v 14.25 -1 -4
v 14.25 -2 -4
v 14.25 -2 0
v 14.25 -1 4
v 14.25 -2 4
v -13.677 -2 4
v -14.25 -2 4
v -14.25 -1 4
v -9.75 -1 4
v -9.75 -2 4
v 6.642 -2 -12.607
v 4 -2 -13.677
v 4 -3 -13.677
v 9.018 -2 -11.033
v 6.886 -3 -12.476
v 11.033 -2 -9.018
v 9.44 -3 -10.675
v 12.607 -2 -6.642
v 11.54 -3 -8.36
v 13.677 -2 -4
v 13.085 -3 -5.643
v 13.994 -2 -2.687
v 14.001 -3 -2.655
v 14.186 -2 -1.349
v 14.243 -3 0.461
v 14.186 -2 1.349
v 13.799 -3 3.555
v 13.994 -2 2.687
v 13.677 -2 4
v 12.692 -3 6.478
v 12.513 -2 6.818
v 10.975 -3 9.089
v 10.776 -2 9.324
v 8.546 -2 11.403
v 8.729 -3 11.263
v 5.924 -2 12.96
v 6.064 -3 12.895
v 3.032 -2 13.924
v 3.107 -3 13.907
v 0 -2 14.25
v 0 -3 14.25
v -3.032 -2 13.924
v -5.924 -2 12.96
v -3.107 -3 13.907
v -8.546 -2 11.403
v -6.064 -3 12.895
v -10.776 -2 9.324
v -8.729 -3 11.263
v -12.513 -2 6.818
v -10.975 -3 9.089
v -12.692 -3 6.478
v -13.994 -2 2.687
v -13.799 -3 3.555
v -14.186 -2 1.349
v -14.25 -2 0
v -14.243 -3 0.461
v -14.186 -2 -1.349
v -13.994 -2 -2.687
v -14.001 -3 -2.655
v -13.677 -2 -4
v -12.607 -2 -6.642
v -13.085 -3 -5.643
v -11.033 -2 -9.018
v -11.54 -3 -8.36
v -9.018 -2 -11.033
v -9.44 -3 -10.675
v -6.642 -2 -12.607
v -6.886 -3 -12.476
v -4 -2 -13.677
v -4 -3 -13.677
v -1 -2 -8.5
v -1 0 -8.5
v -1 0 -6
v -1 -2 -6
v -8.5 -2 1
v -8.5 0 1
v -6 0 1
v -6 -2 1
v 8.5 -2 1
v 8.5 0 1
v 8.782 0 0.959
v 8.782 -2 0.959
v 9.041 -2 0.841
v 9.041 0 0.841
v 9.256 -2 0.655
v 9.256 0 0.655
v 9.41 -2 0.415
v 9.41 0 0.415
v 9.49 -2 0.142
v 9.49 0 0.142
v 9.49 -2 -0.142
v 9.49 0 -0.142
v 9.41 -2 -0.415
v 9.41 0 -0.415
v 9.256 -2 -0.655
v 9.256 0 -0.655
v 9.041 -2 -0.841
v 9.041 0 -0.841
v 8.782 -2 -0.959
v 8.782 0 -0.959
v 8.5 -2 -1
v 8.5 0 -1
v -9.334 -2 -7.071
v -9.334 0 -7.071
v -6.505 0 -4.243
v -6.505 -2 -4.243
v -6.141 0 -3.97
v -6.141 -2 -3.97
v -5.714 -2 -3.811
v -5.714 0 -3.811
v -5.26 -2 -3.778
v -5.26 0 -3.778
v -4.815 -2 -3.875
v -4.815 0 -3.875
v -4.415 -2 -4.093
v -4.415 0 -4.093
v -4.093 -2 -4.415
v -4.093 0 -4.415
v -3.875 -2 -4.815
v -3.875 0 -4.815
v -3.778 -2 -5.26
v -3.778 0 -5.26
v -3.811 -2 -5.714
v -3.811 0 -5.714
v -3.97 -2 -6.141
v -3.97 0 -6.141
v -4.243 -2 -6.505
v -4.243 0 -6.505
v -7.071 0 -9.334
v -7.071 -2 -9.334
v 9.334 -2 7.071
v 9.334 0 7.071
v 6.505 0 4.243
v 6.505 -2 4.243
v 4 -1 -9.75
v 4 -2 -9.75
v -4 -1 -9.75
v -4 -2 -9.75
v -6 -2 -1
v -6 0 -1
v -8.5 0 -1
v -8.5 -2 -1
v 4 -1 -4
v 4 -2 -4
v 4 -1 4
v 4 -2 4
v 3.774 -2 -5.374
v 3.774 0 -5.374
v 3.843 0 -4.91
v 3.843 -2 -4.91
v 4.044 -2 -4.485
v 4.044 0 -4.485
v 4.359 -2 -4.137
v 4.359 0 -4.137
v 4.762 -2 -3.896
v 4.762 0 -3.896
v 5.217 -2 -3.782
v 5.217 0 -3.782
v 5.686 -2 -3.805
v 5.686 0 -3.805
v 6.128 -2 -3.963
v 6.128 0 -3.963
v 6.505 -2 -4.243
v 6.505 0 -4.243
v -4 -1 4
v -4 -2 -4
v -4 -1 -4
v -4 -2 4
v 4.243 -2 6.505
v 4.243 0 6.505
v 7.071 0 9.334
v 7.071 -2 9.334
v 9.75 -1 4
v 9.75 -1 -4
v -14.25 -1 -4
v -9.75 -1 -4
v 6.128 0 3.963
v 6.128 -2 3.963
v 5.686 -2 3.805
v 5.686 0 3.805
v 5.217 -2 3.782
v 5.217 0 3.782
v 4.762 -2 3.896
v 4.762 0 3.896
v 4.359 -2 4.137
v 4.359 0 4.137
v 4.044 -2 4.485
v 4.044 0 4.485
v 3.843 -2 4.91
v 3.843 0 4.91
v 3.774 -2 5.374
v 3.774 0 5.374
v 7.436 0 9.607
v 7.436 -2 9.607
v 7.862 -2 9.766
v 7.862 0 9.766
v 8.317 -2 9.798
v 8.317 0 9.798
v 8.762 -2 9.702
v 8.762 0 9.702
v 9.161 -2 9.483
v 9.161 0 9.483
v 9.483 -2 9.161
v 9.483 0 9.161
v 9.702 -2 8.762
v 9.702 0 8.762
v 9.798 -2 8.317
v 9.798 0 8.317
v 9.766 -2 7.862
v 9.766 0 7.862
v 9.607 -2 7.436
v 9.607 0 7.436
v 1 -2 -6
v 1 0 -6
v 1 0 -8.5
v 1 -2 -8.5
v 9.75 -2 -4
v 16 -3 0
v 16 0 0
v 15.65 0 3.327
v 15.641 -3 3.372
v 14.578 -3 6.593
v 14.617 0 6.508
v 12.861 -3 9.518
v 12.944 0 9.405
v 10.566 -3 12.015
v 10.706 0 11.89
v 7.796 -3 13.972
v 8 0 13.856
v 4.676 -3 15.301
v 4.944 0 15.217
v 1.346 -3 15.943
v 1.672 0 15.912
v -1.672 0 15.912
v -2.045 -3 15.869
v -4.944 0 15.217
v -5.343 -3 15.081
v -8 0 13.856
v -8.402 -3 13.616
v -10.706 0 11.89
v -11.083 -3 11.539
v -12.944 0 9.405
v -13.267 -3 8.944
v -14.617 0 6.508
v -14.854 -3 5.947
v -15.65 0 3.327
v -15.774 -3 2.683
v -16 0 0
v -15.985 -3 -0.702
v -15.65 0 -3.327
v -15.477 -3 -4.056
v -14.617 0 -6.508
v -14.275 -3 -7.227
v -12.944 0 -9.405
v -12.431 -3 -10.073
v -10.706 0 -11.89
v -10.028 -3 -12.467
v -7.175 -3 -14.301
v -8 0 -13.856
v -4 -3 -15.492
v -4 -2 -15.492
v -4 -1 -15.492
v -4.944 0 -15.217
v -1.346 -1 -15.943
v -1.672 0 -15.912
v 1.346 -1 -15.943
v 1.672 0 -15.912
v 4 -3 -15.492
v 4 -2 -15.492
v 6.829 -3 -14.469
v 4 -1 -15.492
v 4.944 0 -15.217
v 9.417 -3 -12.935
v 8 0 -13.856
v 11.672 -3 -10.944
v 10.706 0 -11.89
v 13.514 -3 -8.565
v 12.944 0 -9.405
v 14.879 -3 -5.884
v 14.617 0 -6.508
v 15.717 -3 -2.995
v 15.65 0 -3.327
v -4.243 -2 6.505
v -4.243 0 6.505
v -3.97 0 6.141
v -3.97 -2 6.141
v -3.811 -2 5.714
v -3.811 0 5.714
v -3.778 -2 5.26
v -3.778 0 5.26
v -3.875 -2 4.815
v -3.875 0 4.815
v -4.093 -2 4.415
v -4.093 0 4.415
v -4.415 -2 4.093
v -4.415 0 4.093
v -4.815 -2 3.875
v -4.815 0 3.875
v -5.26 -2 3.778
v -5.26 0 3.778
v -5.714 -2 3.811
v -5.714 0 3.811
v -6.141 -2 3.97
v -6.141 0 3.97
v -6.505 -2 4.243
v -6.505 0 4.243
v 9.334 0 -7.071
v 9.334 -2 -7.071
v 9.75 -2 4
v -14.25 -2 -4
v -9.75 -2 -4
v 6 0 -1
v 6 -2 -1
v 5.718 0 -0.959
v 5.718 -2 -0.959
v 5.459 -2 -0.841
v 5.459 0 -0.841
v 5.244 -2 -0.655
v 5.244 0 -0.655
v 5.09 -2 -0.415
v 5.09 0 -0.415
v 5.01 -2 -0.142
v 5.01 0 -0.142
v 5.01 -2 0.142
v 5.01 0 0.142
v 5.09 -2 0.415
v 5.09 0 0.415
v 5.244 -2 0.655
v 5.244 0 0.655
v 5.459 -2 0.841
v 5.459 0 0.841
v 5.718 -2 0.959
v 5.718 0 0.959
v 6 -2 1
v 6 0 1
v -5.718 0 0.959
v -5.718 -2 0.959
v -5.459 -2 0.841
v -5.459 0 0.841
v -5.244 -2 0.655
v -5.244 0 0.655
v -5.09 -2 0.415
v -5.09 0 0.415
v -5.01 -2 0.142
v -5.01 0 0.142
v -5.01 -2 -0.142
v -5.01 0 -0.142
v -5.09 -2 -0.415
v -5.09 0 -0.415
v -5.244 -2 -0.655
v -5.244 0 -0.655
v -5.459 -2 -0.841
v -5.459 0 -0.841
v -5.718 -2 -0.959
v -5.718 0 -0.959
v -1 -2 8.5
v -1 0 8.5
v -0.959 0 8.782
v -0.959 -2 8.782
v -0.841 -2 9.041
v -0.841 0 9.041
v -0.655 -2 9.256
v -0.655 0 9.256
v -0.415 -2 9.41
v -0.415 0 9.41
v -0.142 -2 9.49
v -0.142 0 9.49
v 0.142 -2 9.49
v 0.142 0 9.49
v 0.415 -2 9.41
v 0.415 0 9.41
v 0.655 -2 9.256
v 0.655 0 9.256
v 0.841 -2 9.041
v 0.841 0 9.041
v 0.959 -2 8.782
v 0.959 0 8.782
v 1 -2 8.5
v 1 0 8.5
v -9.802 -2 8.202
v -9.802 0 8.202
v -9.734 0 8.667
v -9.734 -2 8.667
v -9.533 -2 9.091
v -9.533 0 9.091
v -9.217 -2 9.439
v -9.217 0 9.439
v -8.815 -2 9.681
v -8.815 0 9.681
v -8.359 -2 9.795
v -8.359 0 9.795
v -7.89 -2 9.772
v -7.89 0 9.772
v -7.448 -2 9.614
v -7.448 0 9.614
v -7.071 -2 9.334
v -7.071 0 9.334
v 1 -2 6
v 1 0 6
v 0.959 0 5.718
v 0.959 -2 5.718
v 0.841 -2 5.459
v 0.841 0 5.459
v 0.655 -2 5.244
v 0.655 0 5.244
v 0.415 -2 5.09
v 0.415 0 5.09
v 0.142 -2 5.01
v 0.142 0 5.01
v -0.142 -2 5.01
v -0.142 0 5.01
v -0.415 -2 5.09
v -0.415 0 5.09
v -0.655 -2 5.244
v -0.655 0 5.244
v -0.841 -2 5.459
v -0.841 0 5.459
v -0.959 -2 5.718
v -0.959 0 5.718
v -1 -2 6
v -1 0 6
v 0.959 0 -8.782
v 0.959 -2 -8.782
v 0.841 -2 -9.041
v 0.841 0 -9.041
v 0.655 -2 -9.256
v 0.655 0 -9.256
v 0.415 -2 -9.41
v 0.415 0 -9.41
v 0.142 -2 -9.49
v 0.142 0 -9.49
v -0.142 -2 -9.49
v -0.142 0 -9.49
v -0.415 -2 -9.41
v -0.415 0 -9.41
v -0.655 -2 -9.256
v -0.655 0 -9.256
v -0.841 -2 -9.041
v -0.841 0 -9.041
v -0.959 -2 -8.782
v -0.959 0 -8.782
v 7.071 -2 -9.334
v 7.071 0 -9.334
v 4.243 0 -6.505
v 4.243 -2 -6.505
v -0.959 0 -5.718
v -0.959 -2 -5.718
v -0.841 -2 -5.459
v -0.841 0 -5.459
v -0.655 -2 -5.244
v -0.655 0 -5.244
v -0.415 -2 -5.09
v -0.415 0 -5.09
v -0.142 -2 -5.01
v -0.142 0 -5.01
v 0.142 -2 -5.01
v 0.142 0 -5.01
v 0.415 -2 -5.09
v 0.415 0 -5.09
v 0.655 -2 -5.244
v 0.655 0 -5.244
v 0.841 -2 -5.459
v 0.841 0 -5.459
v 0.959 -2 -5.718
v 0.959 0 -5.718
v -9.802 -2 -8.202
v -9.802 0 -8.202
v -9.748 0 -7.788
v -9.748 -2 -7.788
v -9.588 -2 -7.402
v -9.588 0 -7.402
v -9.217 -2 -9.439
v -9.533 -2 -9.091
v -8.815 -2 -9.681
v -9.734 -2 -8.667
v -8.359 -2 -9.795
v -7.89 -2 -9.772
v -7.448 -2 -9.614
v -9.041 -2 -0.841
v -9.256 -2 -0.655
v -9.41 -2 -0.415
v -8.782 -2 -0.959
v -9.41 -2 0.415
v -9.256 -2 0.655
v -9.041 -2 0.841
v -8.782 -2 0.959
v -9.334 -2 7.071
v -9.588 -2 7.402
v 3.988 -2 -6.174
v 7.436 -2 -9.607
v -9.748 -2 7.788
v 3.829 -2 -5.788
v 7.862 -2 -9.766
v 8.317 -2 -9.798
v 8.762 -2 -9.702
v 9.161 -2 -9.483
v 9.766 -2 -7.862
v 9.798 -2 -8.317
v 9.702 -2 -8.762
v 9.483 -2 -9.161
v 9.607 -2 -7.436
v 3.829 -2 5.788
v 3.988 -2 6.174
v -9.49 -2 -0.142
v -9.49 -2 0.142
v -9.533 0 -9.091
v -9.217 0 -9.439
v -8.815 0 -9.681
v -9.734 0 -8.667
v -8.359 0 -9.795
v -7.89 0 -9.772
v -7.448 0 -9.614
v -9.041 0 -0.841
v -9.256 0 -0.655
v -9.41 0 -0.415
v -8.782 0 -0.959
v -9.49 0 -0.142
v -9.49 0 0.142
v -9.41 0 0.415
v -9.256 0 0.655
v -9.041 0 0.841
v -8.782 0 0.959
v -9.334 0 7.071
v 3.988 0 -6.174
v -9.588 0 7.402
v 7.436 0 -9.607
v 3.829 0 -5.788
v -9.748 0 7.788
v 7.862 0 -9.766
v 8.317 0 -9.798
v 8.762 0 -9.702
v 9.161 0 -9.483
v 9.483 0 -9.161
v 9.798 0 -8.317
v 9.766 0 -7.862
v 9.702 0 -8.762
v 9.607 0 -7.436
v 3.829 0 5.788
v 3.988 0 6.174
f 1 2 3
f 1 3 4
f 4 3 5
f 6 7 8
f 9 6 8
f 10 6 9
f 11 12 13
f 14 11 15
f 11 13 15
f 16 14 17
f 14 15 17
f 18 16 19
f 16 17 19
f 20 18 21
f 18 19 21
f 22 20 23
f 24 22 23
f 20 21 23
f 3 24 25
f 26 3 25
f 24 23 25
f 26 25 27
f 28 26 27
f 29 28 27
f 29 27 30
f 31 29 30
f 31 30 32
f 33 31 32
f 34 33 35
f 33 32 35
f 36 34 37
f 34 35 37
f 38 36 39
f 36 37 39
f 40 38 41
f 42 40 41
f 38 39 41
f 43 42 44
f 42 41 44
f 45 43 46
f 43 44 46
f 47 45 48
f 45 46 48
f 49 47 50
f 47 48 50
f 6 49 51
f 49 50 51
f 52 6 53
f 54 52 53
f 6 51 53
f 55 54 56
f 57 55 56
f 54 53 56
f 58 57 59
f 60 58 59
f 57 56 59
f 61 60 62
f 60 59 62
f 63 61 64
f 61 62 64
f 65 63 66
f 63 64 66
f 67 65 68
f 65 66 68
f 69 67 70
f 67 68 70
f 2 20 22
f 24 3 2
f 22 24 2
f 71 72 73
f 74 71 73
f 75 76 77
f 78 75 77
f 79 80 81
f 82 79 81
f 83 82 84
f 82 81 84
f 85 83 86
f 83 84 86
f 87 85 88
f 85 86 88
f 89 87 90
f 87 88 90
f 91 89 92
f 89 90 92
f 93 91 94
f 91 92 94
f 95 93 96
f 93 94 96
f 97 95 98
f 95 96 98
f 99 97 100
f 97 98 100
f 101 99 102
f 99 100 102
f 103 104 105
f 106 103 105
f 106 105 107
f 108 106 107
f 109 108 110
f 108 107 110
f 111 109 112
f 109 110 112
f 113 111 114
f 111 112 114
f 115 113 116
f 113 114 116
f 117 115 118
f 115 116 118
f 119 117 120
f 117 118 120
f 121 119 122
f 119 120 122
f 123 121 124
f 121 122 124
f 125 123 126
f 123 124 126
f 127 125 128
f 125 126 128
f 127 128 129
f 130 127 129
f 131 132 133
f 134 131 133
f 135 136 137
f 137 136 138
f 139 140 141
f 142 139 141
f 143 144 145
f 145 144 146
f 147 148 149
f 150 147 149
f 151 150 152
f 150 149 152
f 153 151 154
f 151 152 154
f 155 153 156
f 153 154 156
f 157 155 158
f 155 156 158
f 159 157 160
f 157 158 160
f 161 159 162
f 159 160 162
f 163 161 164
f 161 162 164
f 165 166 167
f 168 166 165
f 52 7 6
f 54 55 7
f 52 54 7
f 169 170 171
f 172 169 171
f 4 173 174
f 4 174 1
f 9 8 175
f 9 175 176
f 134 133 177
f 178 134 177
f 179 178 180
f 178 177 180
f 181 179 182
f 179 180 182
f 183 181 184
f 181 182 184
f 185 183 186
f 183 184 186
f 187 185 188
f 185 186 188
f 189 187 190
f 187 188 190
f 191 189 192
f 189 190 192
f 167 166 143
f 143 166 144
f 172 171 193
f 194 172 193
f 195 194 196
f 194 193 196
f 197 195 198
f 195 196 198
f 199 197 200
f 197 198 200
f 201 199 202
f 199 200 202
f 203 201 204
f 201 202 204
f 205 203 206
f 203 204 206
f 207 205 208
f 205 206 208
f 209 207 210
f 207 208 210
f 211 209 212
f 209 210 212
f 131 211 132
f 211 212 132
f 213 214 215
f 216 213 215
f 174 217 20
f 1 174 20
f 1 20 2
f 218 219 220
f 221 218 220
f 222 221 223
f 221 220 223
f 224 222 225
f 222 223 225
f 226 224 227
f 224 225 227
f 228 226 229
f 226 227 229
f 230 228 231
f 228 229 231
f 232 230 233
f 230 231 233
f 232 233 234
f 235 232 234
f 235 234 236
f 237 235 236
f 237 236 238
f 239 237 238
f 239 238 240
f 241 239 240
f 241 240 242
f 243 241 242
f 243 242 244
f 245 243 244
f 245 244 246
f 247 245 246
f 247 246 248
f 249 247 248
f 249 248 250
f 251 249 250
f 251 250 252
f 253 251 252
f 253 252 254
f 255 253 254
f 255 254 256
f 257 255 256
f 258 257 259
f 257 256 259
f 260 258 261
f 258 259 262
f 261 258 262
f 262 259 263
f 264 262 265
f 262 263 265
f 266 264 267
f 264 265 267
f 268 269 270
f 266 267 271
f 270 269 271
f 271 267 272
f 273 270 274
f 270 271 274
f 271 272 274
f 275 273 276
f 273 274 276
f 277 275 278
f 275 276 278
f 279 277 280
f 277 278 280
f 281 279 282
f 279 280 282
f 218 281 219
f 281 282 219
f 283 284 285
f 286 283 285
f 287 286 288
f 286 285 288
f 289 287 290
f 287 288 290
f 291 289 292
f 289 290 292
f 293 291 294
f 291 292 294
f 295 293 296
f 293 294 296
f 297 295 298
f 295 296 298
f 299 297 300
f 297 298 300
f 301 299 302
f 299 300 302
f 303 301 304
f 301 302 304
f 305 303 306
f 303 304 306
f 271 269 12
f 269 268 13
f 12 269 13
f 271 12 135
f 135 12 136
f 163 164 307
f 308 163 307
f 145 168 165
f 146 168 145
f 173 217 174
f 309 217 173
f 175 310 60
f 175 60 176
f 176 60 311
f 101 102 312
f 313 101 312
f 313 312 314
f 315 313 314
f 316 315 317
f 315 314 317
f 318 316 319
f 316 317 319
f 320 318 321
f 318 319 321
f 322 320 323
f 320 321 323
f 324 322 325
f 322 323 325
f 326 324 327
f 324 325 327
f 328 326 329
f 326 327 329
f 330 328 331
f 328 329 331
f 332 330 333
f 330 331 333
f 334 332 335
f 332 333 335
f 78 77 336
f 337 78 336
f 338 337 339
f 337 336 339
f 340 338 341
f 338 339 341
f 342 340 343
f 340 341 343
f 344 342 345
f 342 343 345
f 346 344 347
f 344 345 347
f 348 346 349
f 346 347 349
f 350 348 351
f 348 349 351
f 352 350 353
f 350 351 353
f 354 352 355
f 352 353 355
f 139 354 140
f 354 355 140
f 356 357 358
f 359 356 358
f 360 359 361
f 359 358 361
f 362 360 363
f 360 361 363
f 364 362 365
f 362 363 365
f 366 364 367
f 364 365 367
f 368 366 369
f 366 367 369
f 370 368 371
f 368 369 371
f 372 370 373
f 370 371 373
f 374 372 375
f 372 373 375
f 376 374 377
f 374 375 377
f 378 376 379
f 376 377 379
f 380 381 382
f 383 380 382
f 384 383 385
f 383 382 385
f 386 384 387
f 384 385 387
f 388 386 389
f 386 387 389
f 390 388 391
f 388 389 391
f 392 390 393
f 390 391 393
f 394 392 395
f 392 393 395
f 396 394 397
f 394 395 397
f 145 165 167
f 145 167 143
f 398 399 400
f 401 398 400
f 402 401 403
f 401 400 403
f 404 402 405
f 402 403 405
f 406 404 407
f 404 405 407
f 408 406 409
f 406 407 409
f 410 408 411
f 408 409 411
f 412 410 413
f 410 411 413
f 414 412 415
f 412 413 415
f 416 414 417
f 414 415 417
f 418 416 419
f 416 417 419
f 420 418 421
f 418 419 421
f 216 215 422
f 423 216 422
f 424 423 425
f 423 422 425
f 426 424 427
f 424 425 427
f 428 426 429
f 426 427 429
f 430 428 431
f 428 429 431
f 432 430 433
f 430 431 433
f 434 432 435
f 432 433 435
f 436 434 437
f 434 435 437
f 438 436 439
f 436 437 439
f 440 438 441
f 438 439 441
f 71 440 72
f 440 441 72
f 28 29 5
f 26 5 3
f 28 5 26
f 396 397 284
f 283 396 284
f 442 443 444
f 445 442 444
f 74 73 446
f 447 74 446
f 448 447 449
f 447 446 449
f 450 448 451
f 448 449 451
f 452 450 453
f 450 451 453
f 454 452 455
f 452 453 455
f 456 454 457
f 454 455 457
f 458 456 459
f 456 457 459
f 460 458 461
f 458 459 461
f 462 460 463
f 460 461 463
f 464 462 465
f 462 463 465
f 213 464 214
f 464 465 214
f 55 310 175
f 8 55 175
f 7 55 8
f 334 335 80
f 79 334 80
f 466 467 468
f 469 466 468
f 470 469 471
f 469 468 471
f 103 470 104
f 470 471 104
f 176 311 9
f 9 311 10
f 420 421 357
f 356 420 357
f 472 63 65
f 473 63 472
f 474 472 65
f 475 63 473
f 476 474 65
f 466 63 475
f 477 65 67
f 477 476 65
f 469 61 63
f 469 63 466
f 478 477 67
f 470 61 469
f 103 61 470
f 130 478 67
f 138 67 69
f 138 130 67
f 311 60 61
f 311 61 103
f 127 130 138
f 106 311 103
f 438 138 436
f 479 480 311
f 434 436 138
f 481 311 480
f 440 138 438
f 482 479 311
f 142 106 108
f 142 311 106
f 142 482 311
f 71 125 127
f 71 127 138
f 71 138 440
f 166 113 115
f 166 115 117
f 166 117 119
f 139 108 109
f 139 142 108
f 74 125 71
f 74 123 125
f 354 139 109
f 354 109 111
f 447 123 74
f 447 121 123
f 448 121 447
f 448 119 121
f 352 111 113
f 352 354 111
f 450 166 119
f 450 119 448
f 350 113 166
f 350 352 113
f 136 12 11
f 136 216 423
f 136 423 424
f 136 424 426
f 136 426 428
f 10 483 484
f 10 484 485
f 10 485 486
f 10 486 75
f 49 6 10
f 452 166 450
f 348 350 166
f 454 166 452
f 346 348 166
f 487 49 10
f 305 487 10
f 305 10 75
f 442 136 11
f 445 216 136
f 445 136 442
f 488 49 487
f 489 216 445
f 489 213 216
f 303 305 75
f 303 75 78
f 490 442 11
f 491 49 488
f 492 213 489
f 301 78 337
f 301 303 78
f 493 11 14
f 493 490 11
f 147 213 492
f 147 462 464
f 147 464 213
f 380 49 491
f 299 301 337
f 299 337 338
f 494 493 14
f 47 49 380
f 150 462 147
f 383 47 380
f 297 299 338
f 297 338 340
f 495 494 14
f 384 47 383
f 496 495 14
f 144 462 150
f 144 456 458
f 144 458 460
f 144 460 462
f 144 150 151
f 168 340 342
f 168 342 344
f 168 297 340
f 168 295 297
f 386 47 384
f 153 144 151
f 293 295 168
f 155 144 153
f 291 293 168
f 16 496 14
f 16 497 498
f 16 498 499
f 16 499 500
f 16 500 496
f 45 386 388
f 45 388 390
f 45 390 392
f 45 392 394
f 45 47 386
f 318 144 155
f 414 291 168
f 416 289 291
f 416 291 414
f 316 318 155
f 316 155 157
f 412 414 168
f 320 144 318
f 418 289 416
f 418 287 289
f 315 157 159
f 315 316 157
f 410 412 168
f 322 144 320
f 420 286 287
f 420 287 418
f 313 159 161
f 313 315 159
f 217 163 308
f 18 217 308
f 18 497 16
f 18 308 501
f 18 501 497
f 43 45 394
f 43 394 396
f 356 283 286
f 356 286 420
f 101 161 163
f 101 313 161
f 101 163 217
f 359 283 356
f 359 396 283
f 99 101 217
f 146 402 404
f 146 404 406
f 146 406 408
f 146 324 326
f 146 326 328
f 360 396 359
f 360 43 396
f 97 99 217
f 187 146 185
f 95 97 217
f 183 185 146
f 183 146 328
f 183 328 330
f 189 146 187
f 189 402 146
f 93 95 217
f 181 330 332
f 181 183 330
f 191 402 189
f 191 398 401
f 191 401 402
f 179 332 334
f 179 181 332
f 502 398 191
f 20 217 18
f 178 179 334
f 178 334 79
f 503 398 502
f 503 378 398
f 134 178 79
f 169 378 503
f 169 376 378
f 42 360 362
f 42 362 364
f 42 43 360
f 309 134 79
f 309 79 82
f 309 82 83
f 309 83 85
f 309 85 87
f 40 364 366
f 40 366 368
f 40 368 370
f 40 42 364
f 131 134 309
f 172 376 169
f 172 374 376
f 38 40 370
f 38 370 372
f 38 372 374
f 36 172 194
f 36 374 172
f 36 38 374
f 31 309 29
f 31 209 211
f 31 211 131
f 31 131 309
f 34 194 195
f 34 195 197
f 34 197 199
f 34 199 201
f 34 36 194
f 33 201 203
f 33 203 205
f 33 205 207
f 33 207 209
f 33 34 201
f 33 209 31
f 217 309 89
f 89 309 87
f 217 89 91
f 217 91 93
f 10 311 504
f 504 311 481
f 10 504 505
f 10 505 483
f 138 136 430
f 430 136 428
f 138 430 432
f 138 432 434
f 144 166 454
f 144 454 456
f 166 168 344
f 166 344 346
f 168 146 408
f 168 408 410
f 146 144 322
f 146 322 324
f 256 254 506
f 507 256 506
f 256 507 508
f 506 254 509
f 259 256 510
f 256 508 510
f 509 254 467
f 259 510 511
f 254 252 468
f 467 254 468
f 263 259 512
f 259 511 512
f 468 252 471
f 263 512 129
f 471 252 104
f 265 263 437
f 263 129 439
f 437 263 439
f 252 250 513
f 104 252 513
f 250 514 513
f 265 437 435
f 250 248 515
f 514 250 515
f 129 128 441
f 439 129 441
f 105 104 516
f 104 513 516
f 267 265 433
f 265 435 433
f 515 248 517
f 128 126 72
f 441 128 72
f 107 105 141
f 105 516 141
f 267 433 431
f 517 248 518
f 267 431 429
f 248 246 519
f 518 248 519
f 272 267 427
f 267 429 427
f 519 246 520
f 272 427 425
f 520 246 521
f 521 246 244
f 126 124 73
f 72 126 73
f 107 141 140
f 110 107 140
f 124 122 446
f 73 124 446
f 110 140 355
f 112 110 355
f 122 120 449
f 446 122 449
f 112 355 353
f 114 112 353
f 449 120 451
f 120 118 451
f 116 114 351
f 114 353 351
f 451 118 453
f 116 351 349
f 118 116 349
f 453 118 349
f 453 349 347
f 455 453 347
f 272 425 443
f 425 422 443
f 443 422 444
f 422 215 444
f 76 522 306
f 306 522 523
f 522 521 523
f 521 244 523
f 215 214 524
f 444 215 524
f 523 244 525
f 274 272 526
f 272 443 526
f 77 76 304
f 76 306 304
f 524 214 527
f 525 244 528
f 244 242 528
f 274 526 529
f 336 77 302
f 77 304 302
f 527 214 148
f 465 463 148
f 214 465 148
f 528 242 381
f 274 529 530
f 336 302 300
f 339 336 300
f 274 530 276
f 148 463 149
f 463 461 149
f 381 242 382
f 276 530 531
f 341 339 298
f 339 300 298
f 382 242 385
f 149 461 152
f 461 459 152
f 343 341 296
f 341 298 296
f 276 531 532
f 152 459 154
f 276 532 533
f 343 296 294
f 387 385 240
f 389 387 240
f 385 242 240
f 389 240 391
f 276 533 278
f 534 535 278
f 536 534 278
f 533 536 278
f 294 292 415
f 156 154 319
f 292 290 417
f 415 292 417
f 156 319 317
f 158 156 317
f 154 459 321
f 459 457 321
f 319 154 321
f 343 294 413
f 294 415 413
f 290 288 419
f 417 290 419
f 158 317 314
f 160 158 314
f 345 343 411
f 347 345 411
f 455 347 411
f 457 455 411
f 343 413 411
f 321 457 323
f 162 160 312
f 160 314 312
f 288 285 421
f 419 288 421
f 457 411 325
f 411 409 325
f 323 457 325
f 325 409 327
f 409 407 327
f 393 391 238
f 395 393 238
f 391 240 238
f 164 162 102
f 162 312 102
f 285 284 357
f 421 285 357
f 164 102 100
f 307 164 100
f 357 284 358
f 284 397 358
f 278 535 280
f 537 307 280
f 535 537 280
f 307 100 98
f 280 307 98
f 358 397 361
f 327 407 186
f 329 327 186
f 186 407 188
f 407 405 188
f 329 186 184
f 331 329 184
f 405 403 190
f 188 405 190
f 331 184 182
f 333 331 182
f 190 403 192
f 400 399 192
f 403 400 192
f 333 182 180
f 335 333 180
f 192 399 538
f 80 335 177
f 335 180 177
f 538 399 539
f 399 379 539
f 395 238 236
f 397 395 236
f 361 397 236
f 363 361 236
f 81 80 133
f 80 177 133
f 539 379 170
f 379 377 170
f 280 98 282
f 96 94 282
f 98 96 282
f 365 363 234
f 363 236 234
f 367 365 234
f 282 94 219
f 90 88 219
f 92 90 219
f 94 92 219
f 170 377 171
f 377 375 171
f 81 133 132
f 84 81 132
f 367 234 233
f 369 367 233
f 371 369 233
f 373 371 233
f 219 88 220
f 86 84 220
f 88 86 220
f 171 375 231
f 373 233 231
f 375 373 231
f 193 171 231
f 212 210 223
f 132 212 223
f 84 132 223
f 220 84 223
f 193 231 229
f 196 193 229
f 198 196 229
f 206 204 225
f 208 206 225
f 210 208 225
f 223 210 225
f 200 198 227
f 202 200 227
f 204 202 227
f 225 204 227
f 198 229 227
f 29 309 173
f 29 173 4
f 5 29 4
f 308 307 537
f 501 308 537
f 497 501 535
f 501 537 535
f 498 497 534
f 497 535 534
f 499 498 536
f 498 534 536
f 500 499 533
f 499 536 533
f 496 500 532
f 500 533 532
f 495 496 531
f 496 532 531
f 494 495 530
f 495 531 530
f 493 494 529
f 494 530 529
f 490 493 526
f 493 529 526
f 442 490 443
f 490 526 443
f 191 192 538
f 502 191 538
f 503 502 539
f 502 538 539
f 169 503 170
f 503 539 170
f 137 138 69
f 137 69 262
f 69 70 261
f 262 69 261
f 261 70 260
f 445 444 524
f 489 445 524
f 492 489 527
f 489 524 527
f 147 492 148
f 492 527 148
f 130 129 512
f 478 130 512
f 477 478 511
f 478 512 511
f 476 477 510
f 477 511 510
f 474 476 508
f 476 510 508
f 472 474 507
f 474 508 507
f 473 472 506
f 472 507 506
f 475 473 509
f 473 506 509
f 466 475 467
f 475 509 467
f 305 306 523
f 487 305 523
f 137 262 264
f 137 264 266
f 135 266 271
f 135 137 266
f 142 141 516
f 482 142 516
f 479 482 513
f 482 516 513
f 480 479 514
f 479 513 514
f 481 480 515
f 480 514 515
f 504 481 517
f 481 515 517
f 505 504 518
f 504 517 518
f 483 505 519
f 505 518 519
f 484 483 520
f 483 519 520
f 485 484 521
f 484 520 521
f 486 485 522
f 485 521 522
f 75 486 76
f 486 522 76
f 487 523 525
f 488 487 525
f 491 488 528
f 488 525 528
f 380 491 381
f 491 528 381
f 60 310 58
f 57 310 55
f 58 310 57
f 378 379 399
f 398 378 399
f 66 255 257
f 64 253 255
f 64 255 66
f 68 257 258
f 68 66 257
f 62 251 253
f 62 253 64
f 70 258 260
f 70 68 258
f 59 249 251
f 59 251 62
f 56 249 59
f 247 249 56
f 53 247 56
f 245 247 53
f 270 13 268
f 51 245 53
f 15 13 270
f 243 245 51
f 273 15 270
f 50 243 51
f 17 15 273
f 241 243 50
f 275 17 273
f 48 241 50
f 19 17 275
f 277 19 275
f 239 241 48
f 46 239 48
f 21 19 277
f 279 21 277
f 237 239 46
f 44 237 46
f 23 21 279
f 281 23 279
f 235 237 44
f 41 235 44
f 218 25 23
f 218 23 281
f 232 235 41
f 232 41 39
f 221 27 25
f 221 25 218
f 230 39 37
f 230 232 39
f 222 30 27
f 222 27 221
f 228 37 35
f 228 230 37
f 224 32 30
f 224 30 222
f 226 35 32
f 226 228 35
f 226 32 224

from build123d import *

# Parameters (mm, degrees)
F0_R     = 16
F1_DEPTH = 3
F3_DEPTH = 1
F4_W     = 8
F4_H     = 8
F4_W_2   = 4.5
F5_DEPTH = 1
F7_DEPTH = 3.001
F9_DEPTH = 3.001


with BuildPart() as f1:
    # F0 (on Front) → F1 (new body)
    with BuildSketch(Plane.XZ):
        Circle(F0_R)
    extrude(amount=F1_DEPTH)

    # F2 (on face) → F3 (cut)
    with BuildSketch(Plane.XZ.offset(3)):
        with BuildLine():
            Line((4, -16.6770793666), (4, -13.6770793666))
            ThreePointArc((4, -13.6770793666), (0, 14.25), (-4, -13.6770793666))
            Line((-4, -13.6770793666), (-4, -16.6770793666))
            Line((-4, -16.6770793666), (4, -16.6770793666))
        make_face()
    extrude(amount=-F3_DEPTH, mode=Mode.SUBTRACT)

    # F4 (on face) → F5 (cut)
    with BuildSketch(Plane.XZ.offset(2)):
        Rectangle(F4_W, F4_H)
        with Locations((-12, 0)):
            Rectangle(F4_W_2, F4_H)
        with Locations((12, 0)):
            Rectangle(F4_W_2, F4_H)
        with BuildLine():
            Line((4, -13.6770793666), (4, -9.75))
            Line((4, -9.75), (-4, -9.75))
            Line((-4, -9.75), (-4, -13.6770793666))
            Line((-4, -13.6770793666), (-4, -14.25))
            Line((-4, -14.25), (-4, -15.4919333848))
            ThreePointArc((-4, -15.4919333848), (0, -16), (4, -15.4919333848))
            Line((4, -15.4919333848), (4, -14.25))
            Line((4, -14.25), (4, -13.6770793666))
        make_face()
    extrude(amount=-F5_DEPTH, mode=Mode.SUBTRACT)

    # F6 (on face) → F7 (cut, through all)
    with BuildSketch(Plane(origin=(0, 0, 0), x_dir=(-1, 0, 0), z_dir=(0, 1, 0))):
        with BuildLine():
            Line((1, 6), (1, 8.5))
            ThreePointArc((1, 8.5), (0, 9.5), (-1, 8.5))
            Line((-1, 8.5), (-1, 6))
            ThreePointArc((-1, 6), (0, 5), (1, 6))
        make_face()
        with BuildLine():
            ThreePointArc((-8.5, 1), (-9.5, 0), (-8.5, -1))
            Line((-8.5, -1), (-6, -1))
            ThreePointArc((-6, -1), (-5, 0), (-6, 1))
            Line((-6, 1), (-8.5, 1))
        make_face()
        with BuildLine():
            ThreePointArc((-1, -8.5), (0, -9.5), (1, -8.5))
            Line((1, -8.5), (1, -6))
            ThreePointArc((1, -6), (0, -5), (-1, -6))
            Line((-1, -6), (-1, -8.5))
        make_face()
        with BuildLine():
            ThreePointArc((8.5, -1), (9.5, 0), (8.5, 1))
            Line((8.5, 1), (6, 1))
            ThreePointArc((6, 1), (5, 0), (6, -1))
            Line((6, -1), (8.5, -1))
        make_face()
    extrude(amount=-F7_DEPTH, mode=Mode.SUBTRACT)

    # F8 (on face) → F9 (cut, through all)
    with BuildSketch(Plane(origin=(0, 0, 0), x_dir=(-1, 0, 0), z_dir=(0, 1, 0))):
        with BuildLine():
            ThreePointArc((-7.0710678119, -9.3338095117), (-6.7242314097, -8.8147321535), (-6.6024386618, -8.2024386618))
            ThreePointArc((-6.6024386618, -8.2024386618), (-7.59014517, -6.7242314097), (-9.3338095117, -7.0710678119))
            ThreePointArc((-9.3338095117, -7.0710678119), (-9.3338095117, -9.3338095117), (-7.0710678119, -9.3338095117))
        make_face()
        with BuildLine():
            ThreePointArc((-9.3338095117, -7.0710678119), (-7.59014517, -6.7242314097), (-6.6024386618, -8.2024386618))
            ThreePointArc((-6.6024386618, -8.2024386618), (-6.7242314097, -8.8147321535), (-7.0710678119, -9.3338095117))
            Line((-7.0710678119, -9.3338095117), (-4.2426406871, -6.5053823869))
            ThreePointArc((-4.2426406871, -6.5053823869), (-6.5053823869, -6.5053823869), (-6.5053823869, -4.2426406871))
            Line((-6.5053823869, -4.2426406871), (-9.3338095117, -7.0710678119))
        make_face()
        with BuildLine():
            ThreePointArc((-3.774011537, -5.374011537), (-4.7617180452, -3.895804285), (-6.5053823869, -4.2426406871))
            ThreePointArc((-6.5053823869, -4.2426406871), (-6.5053823869, -6.5053823869), (-4.2426406871, -6.5053823869))
            ThreePointArc((-4.2426406871, -6.5053823869), (-3.895804285, -5.9863050288), (-3.774011537, -5.374011537))
        make_face()
        with BuildLine():
            Line((9.3338095117, -7.0710678119), (6.5053823869, -4.2426406871))
            ThreePointArc((6.5053823869, -4.2426406871), (6.852218789, -4.7617180452), (6.974011537, -5.374011537))
            ThreePointArc((6.974011537, -5.374011537), (5.9863050288, -6.852218789), (4.2426406871, -6.5053823869))
            Line((4.2426406871, -6.5053823869), (7.0710678119, -9.3338095117))
            ThreePointArc((7.0710678119, -9.3338095117), (7.0710678119, -7.0710678119), (9.3338095117, -7.0710678119))
        make_face()
        with BuildLine():
            ThreePointArc((6.974011537, -5.374011537), (6.852218789, -4.7617180452), (6.5053823869, -4.2426406871))
            ThreePointArc((6.5053823869, -4.2426406871), (4.2426406871, -4.2426406871), (4.2426406871, -6.5053823869))
            ThreePointArc((4.2426406871, -6.5053823869), (5.9863050288, -6.852218789), (6.974011537, -5.374011537))
        make_face()
        with BuildLine():
            ThreePointArc((9.8024386618, -8.2024386618), (9.6806459138, -7.59014517), (9.3338095117, -7.0710678119))
            ThreePointArc((9.3338095117, -7.0710678119), (7.0710678119, -7.0710678119), (7.0710678119, -9.3338095117))
            ThreePointArc((7.0710678119, -9.3338095117), (8.8147321535, -9.6806459138), (9.8024386618, -8.2024386618))
        make_face()
        with BuildLine():
            Line((7.0710678119, 9.3338095117), (4.2426406871, 6.5053823869))
            ThreePointArc((4.2426406871, 6.5053823869), (5.9863050288, 6.852218789), (6.974011537, 5.374011537))
            ThreePointArc((6.974011537, 5.374011537), (6.852218789, 4.7617180452), (6.5053823869, 4.2426406871))
            Line((6.5053823869, 4.2426406871), (9.3338095117, 7.0710678119))
            ThreePointArc((9.3338095117, 7.0710678119), (7.0710678119, 7.0710678119), (7.0710678119, 9.3338095117))
        make_face()
        with BuildLine():
            ThreePointArc((6.974011537, 5.374011537), (5.9863050288, 6.852218789), (4.2426406871, 6.5053823869))
            ThreePointArc((4.2426406871, 6.5053823869), (4.2426406871, 4.2426406871), (6.5053823869, 4.2426406871))
            ThreePointArc((6.5053823869, 4.2426406871), (6.852218789, 4.7617180452), (6.974011537, 5.374011537))
        make_face()
        with BuildLine():
            ThreePointArc((9.8024386618, 8.2024386618), (8.8147321535, 9.6806459138), (7.0710678119, 9.3338095117))
            ThreePointArc((7.0710678119, 9.3338095117), (7.0710678119, 7.0710678119), (9.3338095117, 7.0710678119))
            ThreePointArc((9.3338095117, 7.0710678119), (9.6806459138, 7.59014517), (9.8024386618, 8.2024386618))
        make_face()
        with BuildLine():
            Line((-9.3338095117, 7.0710678119), (-6.5053823869, 4.2426406871))
            ThreePointArc((-6.5053823869, 4.2426406871), (-6.5053823869, 6.5053823869), (-4.2426406871, 6.5053823869))
            Line((-4.2426406871, 6.5053823869), (-7.0710678119, 9.3338095117))
            ThreePointArc((-7.0710678119, 9.3338095117), (-6.7242314097, 8.8147321535), (-6.6024386618, 8.2024386618))
            ThreePointArc((-6.6024386618, 8.2024386618), (-7.59014517, 6.7242314097), (-9.3338095117, 7.0710678119))
        make_face()
        with BuildLine():
            ThreePointArc((-4.2426406871, 6.5053823869), (-6.5053823869, 6.5053823869), (-6.5053823869, 4.2426406871))
            ThreePointArc((-6.5053823869, 4.2426406871), (-4.7617180452, 3.895804285), (-3.774011537, 5.374011537))
            ThreePointArc((-3.774011537, 5.374011537), (-3.895804285, 5.9863050288), (-4.2426406871, 6.5053823869))
        make_face()
        with BuildLine():
            ThreePointArc((-7.0710678119, 9.3338095117), (-9.3338095117, 9.3338095117), (-9.3338095117, 7.0710678119))
            ThreePointArc((-9.3338095117, 7.0710678119), (-7.59014517, 6.7242314097), (-6.6024386618, 8.2024386618))
            ThreePointArc((-6.6024386618, 8.2024386618), (-6.7242314097, 8.8147321535), (-7.0710678119, 9.3338095117))
        make_face()
    extrude(amount=-F9_DEPTH, mode=Mode.SUBTRACT)


solid = f1.part
